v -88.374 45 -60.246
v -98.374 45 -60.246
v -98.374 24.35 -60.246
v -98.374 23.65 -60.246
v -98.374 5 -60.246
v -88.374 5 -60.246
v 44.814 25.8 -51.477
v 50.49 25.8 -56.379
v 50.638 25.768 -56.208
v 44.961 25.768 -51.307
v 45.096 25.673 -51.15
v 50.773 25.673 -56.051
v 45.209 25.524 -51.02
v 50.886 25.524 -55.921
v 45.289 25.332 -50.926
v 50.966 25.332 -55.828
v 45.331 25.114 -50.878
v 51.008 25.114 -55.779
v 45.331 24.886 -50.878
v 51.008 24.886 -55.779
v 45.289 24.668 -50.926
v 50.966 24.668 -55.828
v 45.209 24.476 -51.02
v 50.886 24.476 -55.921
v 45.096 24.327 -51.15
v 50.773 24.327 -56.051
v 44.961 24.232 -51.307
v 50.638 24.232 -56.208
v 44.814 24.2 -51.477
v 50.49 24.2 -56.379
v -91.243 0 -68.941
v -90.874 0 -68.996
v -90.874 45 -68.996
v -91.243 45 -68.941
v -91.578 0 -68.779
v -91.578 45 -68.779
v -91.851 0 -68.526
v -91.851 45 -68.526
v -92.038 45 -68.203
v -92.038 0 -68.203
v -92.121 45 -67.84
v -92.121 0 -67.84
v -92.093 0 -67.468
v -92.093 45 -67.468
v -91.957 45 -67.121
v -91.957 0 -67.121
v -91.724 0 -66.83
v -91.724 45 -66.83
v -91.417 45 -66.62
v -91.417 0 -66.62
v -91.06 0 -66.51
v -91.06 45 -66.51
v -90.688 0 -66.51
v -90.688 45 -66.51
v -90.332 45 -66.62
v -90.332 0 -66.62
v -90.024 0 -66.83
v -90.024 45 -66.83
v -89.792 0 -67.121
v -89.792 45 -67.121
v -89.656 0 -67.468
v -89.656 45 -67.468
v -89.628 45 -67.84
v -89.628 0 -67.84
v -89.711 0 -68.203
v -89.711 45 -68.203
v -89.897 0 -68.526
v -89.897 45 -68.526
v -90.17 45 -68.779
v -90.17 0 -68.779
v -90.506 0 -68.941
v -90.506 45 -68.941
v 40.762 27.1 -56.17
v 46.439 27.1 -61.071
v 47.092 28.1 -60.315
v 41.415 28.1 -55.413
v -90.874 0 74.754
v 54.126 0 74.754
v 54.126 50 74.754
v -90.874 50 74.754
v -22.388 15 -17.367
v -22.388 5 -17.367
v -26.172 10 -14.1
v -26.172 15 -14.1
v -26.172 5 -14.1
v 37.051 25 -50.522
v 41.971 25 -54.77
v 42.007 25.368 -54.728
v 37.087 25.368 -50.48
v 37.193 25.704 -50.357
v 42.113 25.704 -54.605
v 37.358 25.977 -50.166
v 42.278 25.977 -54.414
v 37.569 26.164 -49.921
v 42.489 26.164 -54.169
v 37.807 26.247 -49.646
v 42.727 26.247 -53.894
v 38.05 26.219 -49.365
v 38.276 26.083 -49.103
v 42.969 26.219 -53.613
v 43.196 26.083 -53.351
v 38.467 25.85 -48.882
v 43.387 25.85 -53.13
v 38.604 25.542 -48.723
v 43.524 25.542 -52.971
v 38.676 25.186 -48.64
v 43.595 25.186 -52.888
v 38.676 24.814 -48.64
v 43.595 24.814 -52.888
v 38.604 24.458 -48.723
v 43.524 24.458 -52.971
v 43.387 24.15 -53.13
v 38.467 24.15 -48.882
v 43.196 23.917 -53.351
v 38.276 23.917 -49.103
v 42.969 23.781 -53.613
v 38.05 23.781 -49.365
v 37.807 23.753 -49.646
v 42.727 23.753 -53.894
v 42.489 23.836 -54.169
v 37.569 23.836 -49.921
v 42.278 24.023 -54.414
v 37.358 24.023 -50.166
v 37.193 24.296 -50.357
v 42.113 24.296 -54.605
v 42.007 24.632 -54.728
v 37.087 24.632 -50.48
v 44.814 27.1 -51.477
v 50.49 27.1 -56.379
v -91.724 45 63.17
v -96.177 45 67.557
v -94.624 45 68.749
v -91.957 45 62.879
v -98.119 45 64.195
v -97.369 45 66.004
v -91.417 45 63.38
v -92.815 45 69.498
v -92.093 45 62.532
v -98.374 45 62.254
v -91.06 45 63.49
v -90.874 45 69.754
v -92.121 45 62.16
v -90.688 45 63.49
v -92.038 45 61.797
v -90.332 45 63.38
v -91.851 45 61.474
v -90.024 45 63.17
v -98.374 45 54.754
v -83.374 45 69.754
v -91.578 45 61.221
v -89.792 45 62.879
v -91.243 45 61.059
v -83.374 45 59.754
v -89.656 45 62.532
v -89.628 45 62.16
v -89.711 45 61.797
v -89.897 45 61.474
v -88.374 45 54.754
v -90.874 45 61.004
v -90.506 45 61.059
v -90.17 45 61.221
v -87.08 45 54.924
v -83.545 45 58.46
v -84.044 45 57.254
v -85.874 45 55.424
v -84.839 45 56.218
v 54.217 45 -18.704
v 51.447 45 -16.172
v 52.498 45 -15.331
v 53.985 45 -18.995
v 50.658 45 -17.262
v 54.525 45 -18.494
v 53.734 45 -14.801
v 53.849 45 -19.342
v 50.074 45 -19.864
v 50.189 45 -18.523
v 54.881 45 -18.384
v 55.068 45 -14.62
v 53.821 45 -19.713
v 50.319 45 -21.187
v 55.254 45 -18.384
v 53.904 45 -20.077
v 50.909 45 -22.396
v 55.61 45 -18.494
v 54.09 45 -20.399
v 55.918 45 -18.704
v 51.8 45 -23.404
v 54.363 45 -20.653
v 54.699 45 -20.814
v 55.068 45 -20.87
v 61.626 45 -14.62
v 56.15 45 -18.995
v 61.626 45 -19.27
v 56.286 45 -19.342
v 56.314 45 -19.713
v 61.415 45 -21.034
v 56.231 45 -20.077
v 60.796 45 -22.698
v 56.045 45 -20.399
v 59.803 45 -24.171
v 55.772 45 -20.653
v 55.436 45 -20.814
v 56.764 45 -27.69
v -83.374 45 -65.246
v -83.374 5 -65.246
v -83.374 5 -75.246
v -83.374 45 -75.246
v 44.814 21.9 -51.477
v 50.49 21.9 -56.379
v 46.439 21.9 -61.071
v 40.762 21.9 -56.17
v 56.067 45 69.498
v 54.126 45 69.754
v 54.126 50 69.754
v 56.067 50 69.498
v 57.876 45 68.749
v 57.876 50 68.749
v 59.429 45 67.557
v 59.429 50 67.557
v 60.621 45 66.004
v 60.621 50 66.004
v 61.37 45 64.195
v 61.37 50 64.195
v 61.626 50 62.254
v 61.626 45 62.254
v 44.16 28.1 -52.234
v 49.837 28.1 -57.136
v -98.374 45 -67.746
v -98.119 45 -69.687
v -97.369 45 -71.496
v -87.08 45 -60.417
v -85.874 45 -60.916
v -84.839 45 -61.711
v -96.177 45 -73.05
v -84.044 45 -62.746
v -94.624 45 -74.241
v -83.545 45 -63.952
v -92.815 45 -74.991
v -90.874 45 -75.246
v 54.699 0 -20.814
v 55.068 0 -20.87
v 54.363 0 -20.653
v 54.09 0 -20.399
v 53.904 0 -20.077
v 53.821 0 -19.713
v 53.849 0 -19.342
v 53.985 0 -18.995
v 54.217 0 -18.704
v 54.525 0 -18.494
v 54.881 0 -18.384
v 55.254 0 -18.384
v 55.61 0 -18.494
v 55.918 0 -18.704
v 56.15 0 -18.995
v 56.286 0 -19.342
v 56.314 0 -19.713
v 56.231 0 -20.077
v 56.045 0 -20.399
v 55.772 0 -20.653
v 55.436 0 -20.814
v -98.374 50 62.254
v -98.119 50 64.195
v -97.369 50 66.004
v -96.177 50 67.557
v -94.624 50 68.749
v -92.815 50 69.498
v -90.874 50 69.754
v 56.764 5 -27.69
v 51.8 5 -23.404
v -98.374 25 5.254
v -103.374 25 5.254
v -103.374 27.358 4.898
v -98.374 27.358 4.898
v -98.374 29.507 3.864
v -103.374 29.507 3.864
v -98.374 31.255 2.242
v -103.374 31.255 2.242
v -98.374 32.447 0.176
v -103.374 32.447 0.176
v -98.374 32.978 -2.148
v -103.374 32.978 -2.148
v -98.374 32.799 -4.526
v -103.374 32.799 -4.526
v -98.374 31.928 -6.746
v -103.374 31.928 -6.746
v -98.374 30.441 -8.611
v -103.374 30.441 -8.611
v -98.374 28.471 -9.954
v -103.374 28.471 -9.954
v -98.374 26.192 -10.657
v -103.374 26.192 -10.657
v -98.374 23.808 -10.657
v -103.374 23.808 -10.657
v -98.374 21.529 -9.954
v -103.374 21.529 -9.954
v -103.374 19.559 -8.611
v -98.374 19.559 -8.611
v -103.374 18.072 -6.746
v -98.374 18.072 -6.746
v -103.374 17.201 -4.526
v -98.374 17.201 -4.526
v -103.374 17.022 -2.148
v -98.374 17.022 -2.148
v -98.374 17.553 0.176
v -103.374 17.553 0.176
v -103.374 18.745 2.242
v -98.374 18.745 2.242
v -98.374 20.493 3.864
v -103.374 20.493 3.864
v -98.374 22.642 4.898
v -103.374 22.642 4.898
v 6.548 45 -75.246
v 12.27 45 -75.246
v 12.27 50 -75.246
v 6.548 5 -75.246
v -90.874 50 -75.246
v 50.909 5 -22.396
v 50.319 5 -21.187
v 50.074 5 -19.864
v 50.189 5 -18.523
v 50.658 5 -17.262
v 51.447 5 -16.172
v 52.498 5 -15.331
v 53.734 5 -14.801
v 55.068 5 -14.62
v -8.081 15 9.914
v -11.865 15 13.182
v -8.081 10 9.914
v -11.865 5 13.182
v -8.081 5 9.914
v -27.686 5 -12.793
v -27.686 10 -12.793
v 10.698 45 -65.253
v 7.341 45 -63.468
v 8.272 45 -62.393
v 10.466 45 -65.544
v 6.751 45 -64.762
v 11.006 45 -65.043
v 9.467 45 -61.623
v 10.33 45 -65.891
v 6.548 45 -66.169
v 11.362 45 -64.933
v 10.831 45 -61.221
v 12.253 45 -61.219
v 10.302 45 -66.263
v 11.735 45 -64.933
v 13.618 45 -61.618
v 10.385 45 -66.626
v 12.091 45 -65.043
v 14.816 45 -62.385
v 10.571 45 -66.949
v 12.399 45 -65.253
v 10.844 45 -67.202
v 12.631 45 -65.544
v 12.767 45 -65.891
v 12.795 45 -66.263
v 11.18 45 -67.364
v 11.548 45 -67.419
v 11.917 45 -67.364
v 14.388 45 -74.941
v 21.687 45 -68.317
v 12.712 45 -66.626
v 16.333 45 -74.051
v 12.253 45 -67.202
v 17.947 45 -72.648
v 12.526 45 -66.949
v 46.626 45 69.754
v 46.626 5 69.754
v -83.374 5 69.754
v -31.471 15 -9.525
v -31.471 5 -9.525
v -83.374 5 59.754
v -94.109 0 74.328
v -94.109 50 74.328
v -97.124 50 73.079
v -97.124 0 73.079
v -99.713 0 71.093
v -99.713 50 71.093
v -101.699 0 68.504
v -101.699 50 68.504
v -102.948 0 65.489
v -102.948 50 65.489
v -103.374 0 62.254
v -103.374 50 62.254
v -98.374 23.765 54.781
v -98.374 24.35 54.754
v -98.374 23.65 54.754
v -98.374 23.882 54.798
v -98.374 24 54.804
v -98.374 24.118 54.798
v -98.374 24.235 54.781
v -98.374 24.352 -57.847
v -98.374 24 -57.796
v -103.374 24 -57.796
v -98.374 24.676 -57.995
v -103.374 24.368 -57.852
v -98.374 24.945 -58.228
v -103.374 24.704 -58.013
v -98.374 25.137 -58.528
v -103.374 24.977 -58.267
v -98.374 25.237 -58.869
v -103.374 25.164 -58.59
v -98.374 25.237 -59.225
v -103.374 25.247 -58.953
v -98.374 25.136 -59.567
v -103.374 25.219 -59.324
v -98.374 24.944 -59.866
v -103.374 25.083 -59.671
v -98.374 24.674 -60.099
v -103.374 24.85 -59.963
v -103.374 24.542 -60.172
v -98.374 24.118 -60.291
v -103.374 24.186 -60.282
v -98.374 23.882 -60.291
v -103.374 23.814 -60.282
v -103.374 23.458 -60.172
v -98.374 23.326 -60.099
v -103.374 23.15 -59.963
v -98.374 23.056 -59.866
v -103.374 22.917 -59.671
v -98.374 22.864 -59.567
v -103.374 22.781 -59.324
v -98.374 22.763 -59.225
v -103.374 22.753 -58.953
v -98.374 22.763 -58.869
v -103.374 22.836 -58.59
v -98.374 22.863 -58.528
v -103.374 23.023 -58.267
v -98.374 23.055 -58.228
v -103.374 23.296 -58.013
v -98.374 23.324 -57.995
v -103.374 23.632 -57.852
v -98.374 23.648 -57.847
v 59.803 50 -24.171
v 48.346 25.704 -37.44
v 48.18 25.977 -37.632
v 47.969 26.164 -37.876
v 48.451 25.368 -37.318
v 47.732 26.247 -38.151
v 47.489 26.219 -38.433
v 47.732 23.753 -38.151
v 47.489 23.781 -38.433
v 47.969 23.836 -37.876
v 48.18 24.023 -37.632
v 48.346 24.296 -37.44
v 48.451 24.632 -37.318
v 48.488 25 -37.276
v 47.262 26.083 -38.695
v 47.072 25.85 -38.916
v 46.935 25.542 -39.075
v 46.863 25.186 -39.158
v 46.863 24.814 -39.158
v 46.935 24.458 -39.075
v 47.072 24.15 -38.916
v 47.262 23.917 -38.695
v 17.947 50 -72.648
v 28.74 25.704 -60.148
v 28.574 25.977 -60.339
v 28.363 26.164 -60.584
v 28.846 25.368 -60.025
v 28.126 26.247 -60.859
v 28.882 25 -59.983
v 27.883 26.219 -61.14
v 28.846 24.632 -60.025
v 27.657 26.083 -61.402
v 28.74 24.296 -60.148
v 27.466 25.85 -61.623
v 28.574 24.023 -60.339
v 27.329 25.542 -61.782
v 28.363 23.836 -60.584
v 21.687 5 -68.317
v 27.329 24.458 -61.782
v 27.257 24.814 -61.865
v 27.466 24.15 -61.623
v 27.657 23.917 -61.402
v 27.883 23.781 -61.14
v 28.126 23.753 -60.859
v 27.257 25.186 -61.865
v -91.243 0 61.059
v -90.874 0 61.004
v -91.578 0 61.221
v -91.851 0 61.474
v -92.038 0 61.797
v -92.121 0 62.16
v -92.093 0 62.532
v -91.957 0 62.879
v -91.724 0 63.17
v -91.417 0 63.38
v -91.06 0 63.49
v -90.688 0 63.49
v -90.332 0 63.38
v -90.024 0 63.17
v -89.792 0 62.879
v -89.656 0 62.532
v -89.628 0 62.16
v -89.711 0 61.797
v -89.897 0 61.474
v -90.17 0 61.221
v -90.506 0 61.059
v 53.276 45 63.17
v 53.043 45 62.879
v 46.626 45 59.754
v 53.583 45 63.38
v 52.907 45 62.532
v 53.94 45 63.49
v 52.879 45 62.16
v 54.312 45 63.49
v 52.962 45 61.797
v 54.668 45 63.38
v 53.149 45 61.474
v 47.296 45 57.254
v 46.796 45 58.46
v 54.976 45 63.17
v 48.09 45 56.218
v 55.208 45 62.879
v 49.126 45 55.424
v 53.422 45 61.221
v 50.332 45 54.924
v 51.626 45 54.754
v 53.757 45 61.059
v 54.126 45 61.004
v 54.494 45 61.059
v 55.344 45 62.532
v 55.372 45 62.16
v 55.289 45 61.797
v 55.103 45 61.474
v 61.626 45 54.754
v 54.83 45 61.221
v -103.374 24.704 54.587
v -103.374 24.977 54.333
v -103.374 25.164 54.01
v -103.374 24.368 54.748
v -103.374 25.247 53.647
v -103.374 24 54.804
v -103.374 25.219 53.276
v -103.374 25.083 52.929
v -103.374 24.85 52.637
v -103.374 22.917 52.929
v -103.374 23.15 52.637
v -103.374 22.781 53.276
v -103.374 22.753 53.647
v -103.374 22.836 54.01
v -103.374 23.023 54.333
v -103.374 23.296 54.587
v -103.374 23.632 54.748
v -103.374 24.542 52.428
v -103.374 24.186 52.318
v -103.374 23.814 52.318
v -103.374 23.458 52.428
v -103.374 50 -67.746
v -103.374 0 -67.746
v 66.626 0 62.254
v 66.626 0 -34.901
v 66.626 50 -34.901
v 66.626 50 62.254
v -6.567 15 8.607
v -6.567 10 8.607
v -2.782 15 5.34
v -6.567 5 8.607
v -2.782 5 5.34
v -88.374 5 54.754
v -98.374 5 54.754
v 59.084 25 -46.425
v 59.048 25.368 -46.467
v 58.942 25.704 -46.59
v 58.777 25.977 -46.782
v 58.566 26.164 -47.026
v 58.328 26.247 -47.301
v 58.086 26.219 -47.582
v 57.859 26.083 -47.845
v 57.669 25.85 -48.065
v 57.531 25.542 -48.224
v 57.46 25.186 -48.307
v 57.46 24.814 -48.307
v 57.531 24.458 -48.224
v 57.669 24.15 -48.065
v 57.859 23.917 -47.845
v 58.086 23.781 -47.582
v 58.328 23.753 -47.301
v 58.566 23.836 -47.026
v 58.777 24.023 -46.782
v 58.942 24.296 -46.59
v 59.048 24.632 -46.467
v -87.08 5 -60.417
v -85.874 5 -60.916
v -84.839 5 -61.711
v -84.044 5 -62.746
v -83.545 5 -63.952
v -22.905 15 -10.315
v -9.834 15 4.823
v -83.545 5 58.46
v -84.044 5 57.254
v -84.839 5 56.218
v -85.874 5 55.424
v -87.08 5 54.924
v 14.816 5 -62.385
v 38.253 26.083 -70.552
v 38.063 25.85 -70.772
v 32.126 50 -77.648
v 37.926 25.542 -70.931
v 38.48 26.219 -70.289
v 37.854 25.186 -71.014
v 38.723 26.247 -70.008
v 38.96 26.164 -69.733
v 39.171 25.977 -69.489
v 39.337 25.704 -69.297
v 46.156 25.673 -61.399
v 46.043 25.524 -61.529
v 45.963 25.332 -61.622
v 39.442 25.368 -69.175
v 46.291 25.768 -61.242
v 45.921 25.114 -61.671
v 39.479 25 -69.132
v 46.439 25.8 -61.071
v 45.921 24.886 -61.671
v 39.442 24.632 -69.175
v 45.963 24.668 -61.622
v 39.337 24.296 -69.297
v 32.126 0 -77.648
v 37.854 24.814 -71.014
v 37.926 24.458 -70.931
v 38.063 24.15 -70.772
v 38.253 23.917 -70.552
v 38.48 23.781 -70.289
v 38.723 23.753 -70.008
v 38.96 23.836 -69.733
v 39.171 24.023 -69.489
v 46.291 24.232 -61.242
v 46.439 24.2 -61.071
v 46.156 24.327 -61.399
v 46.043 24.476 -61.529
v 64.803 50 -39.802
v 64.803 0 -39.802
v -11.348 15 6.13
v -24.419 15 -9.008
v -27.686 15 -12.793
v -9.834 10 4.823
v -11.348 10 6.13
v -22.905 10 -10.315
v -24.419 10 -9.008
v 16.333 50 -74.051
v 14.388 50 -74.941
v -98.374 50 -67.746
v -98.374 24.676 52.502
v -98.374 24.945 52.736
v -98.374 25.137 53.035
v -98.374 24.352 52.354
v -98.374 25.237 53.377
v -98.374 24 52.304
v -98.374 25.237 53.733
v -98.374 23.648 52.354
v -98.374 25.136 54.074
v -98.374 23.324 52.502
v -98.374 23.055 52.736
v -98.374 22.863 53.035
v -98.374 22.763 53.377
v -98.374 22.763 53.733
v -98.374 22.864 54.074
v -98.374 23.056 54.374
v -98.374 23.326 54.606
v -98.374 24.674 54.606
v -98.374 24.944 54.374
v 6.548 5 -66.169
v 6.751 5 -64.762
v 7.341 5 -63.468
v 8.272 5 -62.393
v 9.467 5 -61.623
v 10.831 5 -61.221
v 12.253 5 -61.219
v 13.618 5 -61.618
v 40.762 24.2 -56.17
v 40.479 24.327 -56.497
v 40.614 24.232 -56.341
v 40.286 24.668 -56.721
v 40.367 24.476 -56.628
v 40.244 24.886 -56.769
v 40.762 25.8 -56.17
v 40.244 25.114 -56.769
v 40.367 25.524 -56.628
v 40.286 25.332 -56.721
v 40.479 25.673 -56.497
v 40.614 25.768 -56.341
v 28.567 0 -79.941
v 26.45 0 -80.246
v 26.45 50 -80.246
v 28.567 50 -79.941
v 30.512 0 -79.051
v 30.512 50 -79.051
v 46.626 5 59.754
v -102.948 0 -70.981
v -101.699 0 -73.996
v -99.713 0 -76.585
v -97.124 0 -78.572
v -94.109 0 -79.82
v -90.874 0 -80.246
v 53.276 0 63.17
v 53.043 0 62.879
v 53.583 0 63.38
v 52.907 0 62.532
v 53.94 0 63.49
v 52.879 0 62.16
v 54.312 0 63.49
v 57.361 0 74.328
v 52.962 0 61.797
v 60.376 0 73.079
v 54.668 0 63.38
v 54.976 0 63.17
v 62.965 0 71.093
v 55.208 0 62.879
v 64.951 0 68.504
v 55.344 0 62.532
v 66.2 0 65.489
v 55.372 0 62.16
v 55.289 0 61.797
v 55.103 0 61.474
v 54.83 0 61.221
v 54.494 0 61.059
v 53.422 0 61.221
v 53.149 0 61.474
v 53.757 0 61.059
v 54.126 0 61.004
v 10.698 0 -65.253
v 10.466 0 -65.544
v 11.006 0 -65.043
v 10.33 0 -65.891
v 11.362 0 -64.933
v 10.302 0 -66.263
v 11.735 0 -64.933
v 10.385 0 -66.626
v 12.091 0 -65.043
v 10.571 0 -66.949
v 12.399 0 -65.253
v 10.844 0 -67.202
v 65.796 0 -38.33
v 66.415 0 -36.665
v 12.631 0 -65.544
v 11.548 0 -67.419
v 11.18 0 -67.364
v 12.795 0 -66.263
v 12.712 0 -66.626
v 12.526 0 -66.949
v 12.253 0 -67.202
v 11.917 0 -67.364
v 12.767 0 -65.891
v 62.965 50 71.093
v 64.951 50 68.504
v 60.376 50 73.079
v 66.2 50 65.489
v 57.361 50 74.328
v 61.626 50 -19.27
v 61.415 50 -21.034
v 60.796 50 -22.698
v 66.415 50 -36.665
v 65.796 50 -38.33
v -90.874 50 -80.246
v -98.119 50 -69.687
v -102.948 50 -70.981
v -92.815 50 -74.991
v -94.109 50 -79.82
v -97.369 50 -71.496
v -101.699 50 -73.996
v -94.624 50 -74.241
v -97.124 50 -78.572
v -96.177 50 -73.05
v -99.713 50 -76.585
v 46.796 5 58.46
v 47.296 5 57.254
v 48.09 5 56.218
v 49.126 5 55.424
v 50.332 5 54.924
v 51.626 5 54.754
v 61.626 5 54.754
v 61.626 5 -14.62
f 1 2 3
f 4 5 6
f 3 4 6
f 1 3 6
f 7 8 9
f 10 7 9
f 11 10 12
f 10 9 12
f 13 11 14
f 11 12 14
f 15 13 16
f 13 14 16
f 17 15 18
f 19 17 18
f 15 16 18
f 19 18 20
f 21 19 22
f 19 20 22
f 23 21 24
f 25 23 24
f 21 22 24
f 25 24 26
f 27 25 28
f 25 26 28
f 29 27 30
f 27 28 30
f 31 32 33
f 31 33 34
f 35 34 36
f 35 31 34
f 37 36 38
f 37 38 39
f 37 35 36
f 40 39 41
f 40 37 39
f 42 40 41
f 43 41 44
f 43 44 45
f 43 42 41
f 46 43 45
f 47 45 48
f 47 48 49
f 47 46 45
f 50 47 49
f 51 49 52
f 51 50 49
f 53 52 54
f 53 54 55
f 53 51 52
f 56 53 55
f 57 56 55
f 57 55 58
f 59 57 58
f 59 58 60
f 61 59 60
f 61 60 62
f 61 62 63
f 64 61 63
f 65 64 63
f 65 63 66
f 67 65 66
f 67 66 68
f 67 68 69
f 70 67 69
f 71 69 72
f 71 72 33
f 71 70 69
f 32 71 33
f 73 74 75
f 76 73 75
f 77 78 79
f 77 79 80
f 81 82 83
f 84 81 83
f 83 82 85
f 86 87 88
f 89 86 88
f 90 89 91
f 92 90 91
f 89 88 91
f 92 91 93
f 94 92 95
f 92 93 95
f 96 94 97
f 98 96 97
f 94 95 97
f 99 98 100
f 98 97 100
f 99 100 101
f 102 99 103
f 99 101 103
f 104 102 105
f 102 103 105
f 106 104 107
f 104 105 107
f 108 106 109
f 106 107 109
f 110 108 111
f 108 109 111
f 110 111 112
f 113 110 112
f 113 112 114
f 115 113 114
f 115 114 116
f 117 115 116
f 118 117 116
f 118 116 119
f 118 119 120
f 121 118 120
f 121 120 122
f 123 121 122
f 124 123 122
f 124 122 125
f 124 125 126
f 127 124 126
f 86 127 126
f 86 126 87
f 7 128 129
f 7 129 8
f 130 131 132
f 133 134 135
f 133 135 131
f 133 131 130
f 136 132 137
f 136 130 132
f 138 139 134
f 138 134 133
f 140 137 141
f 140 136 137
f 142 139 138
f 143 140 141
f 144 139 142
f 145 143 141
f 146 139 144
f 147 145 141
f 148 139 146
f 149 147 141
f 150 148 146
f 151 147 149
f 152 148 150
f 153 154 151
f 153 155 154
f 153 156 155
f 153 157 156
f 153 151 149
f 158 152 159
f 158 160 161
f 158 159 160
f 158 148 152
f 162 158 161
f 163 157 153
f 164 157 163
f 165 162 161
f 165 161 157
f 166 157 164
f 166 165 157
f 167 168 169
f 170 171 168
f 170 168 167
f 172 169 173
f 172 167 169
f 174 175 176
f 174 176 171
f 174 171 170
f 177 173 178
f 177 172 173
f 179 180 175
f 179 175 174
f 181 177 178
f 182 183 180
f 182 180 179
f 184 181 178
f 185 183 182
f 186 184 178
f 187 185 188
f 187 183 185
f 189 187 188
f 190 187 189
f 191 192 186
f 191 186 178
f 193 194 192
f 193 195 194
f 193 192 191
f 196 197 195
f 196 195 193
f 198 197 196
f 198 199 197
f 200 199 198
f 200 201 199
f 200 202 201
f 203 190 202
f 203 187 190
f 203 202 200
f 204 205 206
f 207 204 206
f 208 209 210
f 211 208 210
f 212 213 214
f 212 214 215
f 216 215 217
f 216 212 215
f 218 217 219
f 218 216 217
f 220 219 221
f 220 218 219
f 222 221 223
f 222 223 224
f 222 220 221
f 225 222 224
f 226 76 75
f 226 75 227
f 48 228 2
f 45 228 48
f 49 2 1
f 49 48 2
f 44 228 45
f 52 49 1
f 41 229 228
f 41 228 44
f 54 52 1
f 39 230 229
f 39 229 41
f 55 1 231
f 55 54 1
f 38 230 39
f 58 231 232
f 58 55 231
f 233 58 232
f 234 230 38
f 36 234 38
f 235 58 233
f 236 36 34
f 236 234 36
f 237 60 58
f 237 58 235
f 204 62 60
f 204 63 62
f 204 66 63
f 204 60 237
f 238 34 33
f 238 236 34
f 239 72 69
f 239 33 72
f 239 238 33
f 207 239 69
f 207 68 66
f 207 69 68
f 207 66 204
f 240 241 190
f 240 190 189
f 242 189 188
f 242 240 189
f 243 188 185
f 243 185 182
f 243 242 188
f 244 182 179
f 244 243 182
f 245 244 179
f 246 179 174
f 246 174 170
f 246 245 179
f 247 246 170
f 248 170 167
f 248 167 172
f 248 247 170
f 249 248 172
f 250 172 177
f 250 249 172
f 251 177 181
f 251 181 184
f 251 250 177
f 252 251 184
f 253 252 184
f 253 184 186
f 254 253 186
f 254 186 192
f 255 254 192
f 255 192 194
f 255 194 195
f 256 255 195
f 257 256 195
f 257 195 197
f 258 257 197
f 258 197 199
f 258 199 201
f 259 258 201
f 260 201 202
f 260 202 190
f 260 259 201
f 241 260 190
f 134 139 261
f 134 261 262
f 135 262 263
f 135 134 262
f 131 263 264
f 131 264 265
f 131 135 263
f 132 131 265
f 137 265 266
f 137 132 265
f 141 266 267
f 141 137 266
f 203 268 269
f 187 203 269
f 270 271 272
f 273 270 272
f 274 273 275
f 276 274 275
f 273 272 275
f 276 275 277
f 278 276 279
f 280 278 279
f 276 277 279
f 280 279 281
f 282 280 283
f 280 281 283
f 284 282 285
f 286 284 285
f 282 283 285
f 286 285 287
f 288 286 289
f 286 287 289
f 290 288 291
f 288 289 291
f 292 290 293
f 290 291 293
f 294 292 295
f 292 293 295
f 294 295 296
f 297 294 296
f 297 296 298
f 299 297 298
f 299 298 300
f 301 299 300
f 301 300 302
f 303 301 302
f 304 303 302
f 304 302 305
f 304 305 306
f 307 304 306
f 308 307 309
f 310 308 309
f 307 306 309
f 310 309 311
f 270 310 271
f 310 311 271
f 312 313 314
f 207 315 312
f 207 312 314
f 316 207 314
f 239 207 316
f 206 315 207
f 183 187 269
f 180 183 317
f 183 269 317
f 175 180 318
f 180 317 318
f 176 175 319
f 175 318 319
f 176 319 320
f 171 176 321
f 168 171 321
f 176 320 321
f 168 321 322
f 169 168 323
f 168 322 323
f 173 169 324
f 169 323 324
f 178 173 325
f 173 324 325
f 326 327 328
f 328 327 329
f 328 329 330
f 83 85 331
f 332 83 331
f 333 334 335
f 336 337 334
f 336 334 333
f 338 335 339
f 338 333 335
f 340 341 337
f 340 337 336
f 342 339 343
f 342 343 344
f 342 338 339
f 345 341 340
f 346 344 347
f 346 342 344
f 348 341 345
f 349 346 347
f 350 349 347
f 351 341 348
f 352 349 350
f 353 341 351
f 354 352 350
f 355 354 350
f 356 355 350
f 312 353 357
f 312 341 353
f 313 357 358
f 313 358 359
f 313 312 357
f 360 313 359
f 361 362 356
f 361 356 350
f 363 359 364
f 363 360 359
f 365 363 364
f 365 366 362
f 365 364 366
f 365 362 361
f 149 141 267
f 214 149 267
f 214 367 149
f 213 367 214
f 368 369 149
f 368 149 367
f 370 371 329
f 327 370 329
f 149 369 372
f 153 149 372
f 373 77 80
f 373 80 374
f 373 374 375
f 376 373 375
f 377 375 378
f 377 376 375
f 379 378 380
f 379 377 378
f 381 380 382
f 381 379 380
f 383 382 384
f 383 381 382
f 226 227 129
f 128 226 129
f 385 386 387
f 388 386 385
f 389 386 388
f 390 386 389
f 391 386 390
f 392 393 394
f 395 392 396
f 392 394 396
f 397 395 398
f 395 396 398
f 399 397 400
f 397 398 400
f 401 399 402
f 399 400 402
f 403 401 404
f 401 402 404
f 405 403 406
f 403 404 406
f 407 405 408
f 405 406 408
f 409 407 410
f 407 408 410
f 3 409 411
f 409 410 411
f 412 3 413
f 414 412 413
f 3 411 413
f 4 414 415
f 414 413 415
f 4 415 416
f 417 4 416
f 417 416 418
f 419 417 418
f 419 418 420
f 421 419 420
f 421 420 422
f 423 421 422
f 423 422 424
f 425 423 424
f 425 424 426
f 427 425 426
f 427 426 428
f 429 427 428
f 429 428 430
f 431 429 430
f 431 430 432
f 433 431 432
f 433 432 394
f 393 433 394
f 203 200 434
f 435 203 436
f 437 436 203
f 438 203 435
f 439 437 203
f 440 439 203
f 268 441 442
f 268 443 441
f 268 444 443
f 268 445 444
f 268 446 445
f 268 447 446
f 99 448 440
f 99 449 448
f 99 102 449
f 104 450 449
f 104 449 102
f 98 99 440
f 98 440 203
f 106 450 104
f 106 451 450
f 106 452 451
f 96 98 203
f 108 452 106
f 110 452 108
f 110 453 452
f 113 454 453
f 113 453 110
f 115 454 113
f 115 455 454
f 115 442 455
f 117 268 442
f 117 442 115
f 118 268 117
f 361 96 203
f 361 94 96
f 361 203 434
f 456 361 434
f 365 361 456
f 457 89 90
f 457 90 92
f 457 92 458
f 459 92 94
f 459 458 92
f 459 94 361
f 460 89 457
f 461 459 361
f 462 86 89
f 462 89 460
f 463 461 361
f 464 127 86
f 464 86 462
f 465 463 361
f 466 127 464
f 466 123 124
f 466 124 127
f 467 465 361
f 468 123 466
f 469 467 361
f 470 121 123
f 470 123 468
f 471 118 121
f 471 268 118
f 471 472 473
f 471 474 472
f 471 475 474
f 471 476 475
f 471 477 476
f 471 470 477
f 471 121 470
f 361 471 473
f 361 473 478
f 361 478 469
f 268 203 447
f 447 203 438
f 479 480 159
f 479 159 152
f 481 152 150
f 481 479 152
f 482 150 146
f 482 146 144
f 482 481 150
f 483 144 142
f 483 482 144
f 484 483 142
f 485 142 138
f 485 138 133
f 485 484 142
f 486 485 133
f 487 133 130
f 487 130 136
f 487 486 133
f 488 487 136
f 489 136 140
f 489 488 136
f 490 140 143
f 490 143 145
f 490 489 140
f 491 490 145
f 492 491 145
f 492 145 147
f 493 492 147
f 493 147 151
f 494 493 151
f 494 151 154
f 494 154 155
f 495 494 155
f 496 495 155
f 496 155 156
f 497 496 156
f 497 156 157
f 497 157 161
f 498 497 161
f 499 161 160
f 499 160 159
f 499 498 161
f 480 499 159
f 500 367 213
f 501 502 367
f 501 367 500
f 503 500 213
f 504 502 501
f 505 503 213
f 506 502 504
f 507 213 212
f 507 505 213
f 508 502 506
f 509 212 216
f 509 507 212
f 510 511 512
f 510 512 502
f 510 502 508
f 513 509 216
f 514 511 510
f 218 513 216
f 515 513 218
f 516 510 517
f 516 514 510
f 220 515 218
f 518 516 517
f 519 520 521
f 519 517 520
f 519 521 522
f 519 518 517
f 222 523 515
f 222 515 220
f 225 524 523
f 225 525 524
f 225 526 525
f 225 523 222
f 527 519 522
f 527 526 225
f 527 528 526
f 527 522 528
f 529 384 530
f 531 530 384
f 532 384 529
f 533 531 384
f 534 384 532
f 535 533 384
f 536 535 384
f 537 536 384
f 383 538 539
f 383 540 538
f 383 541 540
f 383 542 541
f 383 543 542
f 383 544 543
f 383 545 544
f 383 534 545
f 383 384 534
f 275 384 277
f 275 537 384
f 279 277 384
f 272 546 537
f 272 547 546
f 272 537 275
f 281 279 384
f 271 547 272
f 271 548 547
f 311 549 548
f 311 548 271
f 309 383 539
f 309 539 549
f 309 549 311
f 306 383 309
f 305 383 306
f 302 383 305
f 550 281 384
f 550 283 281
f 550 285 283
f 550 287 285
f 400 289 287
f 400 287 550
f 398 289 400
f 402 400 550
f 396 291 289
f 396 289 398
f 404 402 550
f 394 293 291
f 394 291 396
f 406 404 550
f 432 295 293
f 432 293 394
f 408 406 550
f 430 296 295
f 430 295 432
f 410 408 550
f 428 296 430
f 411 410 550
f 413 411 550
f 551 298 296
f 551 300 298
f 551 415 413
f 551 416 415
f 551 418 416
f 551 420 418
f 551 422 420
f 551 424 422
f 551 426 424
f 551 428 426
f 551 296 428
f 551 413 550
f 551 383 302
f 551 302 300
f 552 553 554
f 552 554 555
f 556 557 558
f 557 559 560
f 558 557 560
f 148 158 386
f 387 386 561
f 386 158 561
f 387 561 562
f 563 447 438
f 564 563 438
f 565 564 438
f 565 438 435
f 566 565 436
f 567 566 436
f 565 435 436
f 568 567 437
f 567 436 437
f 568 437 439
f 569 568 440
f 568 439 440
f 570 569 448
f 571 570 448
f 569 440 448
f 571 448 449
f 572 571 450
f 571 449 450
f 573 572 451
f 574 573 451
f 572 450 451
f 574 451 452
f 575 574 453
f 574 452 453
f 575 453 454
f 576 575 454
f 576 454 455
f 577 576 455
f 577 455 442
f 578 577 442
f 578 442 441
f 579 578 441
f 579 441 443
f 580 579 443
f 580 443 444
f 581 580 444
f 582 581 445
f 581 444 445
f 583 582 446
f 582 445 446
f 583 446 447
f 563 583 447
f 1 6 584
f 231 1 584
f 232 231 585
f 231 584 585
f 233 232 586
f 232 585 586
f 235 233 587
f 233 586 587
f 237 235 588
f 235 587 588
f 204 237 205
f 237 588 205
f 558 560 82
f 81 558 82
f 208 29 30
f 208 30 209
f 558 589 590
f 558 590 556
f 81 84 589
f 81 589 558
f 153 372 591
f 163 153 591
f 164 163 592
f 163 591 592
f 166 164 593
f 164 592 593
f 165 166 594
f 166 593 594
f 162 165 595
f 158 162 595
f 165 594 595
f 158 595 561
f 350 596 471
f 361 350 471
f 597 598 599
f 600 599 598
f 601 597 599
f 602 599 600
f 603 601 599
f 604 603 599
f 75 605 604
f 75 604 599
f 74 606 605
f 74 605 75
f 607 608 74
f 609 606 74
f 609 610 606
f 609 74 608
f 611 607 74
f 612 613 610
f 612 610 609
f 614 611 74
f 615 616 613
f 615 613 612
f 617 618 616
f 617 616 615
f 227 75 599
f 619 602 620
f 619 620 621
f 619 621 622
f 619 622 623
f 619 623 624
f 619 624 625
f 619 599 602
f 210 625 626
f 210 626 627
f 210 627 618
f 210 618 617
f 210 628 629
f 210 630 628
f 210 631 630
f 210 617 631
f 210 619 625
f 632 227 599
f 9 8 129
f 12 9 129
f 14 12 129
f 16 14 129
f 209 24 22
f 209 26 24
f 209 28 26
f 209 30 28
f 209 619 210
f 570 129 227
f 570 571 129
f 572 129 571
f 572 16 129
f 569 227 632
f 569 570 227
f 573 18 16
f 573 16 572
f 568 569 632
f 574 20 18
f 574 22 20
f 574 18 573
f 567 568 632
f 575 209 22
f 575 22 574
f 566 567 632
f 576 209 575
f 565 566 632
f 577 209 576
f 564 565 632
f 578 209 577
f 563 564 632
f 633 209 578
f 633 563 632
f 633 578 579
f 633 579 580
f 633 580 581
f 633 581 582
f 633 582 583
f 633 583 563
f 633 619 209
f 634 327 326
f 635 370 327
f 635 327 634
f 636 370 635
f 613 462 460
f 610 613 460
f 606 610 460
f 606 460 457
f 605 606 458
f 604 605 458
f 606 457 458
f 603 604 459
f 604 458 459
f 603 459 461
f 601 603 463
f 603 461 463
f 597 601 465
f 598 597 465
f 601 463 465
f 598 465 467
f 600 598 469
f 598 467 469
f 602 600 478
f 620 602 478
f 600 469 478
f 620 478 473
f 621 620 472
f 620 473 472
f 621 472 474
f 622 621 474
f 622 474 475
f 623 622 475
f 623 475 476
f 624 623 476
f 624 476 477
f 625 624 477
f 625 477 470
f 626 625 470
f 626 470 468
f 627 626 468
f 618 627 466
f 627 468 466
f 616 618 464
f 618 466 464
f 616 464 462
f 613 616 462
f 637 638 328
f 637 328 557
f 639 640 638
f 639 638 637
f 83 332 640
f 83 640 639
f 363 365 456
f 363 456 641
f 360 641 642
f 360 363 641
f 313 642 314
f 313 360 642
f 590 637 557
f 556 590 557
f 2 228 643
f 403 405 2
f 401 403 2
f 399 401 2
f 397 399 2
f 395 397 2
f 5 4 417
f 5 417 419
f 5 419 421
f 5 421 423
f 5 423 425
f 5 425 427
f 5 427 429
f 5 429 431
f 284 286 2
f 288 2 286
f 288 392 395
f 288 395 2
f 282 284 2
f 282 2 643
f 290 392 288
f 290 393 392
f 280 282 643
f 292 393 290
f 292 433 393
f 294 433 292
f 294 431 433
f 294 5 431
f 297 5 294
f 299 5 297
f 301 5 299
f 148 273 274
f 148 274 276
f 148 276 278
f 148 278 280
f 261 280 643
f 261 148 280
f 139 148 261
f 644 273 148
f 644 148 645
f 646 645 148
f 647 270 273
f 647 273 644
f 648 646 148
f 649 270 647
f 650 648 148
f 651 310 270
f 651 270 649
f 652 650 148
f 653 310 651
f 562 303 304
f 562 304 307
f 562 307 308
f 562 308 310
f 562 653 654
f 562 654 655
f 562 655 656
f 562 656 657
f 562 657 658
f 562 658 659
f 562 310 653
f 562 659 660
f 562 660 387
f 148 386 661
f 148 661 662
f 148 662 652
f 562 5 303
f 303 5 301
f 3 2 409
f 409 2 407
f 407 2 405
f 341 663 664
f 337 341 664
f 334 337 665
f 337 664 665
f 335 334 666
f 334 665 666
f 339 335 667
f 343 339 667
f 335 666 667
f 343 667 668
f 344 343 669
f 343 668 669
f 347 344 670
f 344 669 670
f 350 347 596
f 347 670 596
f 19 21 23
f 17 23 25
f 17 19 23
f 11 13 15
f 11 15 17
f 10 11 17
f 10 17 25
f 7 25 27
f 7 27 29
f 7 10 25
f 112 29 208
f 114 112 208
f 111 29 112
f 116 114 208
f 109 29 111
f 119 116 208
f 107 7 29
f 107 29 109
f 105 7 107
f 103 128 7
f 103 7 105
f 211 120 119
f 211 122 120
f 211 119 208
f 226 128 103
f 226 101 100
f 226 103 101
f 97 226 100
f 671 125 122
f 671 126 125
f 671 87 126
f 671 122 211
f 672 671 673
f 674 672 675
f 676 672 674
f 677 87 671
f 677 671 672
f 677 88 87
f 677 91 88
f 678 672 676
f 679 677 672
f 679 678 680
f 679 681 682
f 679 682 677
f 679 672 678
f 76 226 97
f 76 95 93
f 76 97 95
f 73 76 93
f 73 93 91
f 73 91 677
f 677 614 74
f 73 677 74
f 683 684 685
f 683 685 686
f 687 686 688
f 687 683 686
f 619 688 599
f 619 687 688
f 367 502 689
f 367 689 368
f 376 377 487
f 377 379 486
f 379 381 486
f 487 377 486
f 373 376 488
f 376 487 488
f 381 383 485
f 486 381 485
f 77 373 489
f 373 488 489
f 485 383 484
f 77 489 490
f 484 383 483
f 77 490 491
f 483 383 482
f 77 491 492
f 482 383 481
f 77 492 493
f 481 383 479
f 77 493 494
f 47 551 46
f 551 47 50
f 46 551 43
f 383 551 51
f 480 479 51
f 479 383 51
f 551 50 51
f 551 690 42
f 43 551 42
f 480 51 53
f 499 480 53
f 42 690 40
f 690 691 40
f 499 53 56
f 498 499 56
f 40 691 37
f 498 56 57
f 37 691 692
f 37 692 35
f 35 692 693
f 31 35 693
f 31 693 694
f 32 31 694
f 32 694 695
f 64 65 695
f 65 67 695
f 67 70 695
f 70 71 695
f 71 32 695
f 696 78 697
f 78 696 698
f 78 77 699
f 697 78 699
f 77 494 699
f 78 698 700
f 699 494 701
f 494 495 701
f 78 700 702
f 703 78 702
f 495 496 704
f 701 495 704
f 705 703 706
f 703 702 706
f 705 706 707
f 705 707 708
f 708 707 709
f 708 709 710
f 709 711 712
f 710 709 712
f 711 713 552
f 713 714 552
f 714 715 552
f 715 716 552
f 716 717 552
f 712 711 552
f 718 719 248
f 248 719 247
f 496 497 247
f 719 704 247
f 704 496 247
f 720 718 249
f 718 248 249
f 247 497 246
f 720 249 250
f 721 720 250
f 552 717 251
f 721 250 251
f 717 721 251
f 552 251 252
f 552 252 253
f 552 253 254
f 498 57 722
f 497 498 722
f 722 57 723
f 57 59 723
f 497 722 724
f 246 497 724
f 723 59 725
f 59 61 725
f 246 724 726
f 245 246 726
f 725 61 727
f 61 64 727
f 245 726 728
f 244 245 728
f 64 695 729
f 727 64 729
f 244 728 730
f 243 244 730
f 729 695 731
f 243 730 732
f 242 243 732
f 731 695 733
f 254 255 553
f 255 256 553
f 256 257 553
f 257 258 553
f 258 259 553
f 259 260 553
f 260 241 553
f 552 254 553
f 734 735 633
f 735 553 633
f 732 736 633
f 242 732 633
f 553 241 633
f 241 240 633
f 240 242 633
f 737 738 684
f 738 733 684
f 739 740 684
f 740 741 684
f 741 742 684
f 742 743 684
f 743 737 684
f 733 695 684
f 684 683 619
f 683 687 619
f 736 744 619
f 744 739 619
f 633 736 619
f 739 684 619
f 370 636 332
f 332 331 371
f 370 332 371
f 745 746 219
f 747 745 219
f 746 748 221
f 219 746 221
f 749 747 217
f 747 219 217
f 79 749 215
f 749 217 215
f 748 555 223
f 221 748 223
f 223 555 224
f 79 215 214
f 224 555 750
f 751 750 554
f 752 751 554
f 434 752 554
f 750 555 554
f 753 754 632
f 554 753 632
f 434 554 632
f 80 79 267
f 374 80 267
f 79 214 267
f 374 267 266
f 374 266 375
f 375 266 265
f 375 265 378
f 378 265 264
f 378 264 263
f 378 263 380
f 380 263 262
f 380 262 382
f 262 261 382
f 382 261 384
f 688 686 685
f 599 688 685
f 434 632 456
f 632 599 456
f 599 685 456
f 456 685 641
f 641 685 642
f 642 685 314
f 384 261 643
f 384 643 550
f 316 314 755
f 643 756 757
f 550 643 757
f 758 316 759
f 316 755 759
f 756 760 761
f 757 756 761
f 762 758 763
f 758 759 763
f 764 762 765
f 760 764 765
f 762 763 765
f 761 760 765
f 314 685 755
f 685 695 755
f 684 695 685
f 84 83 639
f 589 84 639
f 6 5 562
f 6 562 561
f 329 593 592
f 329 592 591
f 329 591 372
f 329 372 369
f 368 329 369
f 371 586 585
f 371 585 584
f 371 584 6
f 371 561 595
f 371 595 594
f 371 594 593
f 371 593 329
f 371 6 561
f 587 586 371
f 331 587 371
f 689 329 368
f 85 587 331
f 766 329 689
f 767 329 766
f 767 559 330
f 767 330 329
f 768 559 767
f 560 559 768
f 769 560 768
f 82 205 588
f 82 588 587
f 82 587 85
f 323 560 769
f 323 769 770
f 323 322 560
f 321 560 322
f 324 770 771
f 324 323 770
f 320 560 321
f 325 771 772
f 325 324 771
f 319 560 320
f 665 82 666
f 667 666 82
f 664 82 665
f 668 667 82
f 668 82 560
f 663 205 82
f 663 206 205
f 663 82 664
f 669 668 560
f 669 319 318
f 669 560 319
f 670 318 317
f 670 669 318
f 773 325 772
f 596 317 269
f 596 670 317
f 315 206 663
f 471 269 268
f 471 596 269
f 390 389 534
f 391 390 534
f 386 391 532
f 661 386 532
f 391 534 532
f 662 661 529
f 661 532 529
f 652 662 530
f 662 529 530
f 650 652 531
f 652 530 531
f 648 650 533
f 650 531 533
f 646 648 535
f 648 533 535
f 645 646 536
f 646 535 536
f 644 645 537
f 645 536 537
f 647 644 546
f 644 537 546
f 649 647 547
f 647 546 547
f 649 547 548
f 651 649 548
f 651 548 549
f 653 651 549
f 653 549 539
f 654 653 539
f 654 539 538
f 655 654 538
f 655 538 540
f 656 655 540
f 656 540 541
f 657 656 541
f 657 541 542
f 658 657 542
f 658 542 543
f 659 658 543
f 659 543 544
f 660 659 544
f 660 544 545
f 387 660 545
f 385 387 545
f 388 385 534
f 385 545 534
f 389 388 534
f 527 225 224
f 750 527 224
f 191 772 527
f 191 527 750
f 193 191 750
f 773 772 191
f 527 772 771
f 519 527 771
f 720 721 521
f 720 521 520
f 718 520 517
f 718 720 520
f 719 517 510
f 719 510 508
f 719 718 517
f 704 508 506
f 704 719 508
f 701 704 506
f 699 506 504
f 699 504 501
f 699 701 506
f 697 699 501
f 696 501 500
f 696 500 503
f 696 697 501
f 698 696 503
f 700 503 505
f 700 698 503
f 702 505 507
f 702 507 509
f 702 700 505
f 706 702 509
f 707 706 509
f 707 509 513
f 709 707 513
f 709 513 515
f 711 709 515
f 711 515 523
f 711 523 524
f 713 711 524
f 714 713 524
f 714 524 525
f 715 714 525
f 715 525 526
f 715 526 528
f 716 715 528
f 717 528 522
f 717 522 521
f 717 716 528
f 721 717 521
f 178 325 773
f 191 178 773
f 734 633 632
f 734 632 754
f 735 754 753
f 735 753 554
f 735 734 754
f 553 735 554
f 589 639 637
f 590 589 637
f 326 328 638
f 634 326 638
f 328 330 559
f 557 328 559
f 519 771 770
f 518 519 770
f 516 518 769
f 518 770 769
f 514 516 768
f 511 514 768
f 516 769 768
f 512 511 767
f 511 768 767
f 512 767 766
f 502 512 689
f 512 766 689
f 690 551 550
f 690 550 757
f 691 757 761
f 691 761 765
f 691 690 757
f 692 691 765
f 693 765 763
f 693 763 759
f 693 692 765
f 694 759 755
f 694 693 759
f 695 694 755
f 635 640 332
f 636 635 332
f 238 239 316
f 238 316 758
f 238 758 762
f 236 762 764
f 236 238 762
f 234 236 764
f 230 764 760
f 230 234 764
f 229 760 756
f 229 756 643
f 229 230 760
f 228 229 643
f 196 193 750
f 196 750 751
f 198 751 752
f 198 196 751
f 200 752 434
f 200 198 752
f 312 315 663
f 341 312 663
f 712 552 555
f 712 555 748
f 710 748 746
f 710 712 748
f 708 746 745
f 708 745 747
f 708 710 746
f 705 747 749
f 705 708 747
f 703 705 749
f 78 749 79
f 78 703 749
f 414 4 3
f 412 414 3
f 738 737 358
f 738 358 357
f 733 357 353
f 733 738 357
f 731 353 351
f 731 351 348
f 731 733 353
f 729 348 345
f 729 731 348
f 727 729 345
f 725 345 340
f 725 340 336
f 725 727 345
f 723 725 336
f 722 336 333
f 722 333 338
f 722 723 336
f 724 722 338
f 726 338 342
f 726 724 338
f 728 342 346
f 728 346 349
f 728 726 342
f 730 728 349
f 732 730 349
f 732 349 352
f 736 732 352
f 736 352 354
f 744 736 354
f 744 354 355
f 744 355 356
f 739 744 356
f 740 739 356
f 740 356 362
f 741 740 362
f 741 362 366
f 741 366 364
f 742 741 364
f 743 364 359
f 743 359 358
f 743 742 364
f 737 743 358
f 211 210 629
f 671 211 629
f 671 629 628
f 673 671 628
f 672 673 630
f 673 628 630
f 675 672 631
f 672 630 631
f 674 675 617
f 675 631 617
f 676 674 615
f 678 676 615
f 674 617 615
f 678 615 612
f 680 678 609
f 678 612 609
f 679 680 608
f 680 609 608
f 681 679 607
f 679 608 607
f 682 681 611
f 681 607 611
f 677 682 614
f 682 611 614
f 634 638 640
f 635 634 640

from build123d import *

# Parameters (mm, degrees)
EXTRUDE_2_DEPTH     = 5
EXTRUDE_2_2_DEPTH   = 5
EXTRUDE_3_DEPTH     = 50
EXTRUDE_4_DEPTH     = 10
CUT_EXTRUDE_1_DEPTH = 7.5
SKETCH_9_R          = 1.25
CUT_EXTRUDE_3_DEPTH = 20
SKETCH_10_R         = 8
SKETCH_10_R_2       = 1.25
CUT_EXTRUDE_7_DEPTH = 5
SKETCH_1_9_R        = 1.25
EXTRUDE_5_DEPTH     = 45
SKETCH_14_R         = 1.25
CUT_EXTRUDE_8_DEPTH = 14
EXTRUDE_6_DEPTH     = 15


# Read off the part's stored shape, not the designer's step: 凸台-拉伸4
with BuildPart() as part:
    # 草图1 → 凸台-拉伸2 (new body)
    with BuildSketch(Plane(origin=(0, 0, 0), x_dir=(1, 0, 0), z_dir=(0, 1, 0))):
        with BuildLine():
            Line((6.548408352, 75.246242124), (-83.374180902, 75.246242124))
            Line((-83.374180902, 75.246242124), (-83.374180902, 65.246242124))
            ThreePointArc((-83.374180902, 65.246242124), (-84.838646996, 61.710708218), (-88.374180902, 60.246242124))
            Line((-88.374180902, 60.246242124), (-98.374180902, 60.246242124))
            Line((-98.374180902, 60.246242124), (-98.374180902, -54.753757876))
            Line((-98.374180902, -54.753757876), (-88.374180902, -54.753757876))
            ThreePointArc((-88.374180902, -54.753757876), (-84.838646996, -56.21822397), (-83.374180902, -59.753757876))
            Line((-83.374180902, -59.753757876), (-83.374180902, -69.753757876))
            Line((-83.374180902, -69.753757876), (46.625819098, -69.753757876))
            Line((46.625819098, -69.753757876), (46.625819098, -59.753757876))
            ThreePointArc((46.625819098, -59.753757876), (48.090285193, -56.21822397), (51.625819098, -54.753757876))
            Line((51.625819098, -54.753757876), (61.625819098, -54.753757876))
            Line((61.625819098, -54.753757876), (61.625819098, 14.619924984))
            Line((61.625819098, 14.619924984), (55.067595409, 14.619924984))
            ThreePointArc((55.067595409, 14.619924984), (50.381304866, 17.876743713), (51.799973847, 23.404452606))
            Line((51.799973847, 23.404452606), (56.763929588, 27.690411234))
            Line((56.763929588, 27.690411234), (21.686518841, 68.316728374))
            Line((21.686518841, 68.316728374), (14.816029914, 62.384638559))
            ThreePointArc((14.816029914, 62.384638559), (9.467315828, 61.622843062), (6.548408352, 66.169166182))
            Line((6.548408352, 66.169166182), (6.548408352, 75.246242124))
        make_face()
        Polygon((-31.470797546, 9.525154804), (-22.387931252, 17.367446554), (-2.782201877, -5.33971918), (-11.865068171, -13.18201093), align=None, mode=Mode.SUBTRACT)
    extrude(amount=EXTRUDE_2_DEPTH)

    # 草图1<6> → 凸台-拉伸3 (add)
    with BuildSketch(Plane(origin=(0, 0, 0), x_dir=(1, 0, 0), z_dir=(0, 1, 0))):
        with BuildLine():
            Line((66.625819098, 34.900965901), (66.625819098, -62.253757876))
            ThreePointArc((66.625819098, -62.253757876), (62.964653863, -71.092592641), (54.125819098, -74.753757876))
            Line((54.125819098, -74.753757876), (-90.874180902, -74.753757876))
            ThreePointArc((-90.874180902, -74.753757876), (-99.713015666, -71.092592641), (-103.374180902, -62.253757876))
            Line((-103.374180902, -62.253757876), (-103.374180902, 67.746242124))
            ThreePointArc((-103.374180902, 67.746242124), (-99.713015666, 76.585076889), (-90.874180902, 80.246242124))
            Line((-90.874180902, 80.246242124), (26.449603474, 80.246242124))
            ThreePointArc((26.449603474, 80.246242124), (29.57124226, 79.565726803), (32.126394907, 77.647674468))
            Line((32.126394907, 77.647674468), (64.802610532, 39.802398244))
            ThreePointArc((64.802610532, 39.802398244), (66.155254913, 37.515737807), (66.625819098, 34.900965901))
        make_face()
        with BuildLine():
            ThreePointArc((61.625819098, 19.269608073), (61.155254913, 21.88437998), (59.802610532, 24.171040417))
            Line((59.802610532, 24.171040417), (17.947110848, 72.647674468))
            ThreePointArc((17.947110848, 72.647674468), (15.3919582, 74.565726803), (12.270319414, 75.246242124))
            Line((12.270319414, 75.246242124), (-90.874180902, 75.246242124))
            ThreePointArc((-90.874180902, 75.246242124), (-96.17748176, 73.049542983), (-98.374180902, 67.746242124))
            Line((-98.374180902, 67.746242124), (-98.374180902, -62.253757876))
            ThreePointArc((-98.374180902, -62.253757876), (-96.17748176, -67.557058735), (-90.874180902, -69.753757876))
            Line((-90.874180902, -69.753757876), (54.125819098, -69.753757876))
            ThreePointArc((54.125819098, -69.753757876), (59.429119957, -67.557058735), (61.625819098, -62.253757876))
            Line((61.625819098, -62.253757876), (61.625819098, 19.269608073))
        make_face(mode=Mode.SUBTRACT)
    extrude(amount=EXTRUDE_3_DEPTH)

    # 凸台-拉伸4 outline → 凸台-拉伸4 (add)
    with BuildSketch(Plane(origin=(0, 0, 0), x_dir=(1, 0, 0), z_dir=(0, 1, 0))):
        Polygon((-6.5667295, -8.607340743), (-26.172458875, 14.099824991), (-27.686269924, 12.792776366), (-8.080540549, -9.914389368), align=None)
    extrude(amount=EXTRUDE_4_DEPTH)

    # 草图6 → 切除-拉伸1 (cut)
    with BuildSketch(Plane(origin=(56.814304212, 0, -49.054377198), x_dir=(-0.6535243124977221, 0, -0.7569055244707755), z_dir=(0.7569055244707754, 0, -0.653524312497722))):
        with BuildLine():
            Line((9.676573622, 24.2), (9.676573622, 21.9))
            Line((9.676573622, 21.9), (15.876573622, 21.9))
            Line((15.876573622, 21.9), (15.876573622, 24.2))
            ThreePointArc((15.876573622, 24.2), (16.676573622, 25), (15.876573622, 25.8))
            Line((15.876573622, 25.8), (15.876573622, 27.1))
            Line((15.876573622, 27.1), (14.876573622, 28.1))
            Line((14.876573622, 28.1), (10.676573622, 28.1))
            Line((10.676573622, 28.1), (9.676573622, 27.1))
            Line((9.676573622, 27.1), (9.676573622, 25.8))
            ThreePointArc((9.676573622, 25.8), (8.876573622, 25), (9.676573622, 24.2))
        make_face()
    extrude(amount=-CUT_EXTRUDE_1_DEPTH, mode=Mode.SUBTRACT)

    # 草图9 → 切除-拉伸3 (cut)
    with BuildSketch(Plane(origin=(51.137512779, 0, -44.152944854), x_dir=(-0.6535243124977224, 0, -0.7569055244707754), z_dir=(0.7569055244707754, 0, -0.6535243124977224))):
        with Locations((12.776573622, 25)):
            Circle(SKETCH_9_R)
    extrude(amount=-CUT_EXTRUDE_3_DEPTH, mode=Mode.SUBTRACT)

    # 草图10 → 切除-拉伸7 (cut)
    with BuildSketch(Plane.ZY.offset(103.374180902)):
        with Locations((-2.746242124, 25)):
            Circle(SKETCH_10_R)
        with Locations((-59.046242124, 24)):
            Circle(SKETCH_10_R_2)
        with Locations((53.553757876, 24)):
            Circle(SKETCH_10_R_2)
    extrude(amount=-CUT_EXTRUDE_7_DEPTH, mode=Mode.SUBTRACT)

    # 草图1<9> → 凸台-拉伸5 (add)
    # profile 1 of 5: a face of its own
    with BuildSketch(Plane(origin=(0, 0, 0), x_dir=(1, 0, 0), z_dir=(0, 1, 0))):
        with BuildLine():
            Line((-83.374180902, 75.246242124), (-90.874180902, 75.246242124))
            ThreePointArc((-90.874180902, 75.246242124), (-96.17748176, 73.049542983), (-98.374180902, 67.746242124))
            Line((-98.374180902, 67.746242124), (-98.374180902, 60.246242124))
            Line((-98.374180902, 60.246242124), (-88.374180902, 60.246242124))
            ThreePointArc((-88.374180902, 60.246242124), (-84.838646996, 61.710708218), (-83.374180902, 65.246242124))
            Line((-83.374180902, 65.246242124), (-83.374180902, 75.246242124))
        make_face()
        with Locations(Location((-90.874180902, 67.746242124, 0), (0, 0, 90))):
            Circle(SKETCH_1_9_R, mode=Mode.SUBTRACT)
    # profile 2 of 5: a face of its own
    with BuildSketch(Plane(origin=(0, 0, 0), x_dir=(1, 0, 0), z_dir=(0, 1, 0))):
        with BuildLine():
            Line((-88.374180902, -54.753757876), (-98.374180902, -54.753757876))
            Line((-98.374180902, -54.753757876), (-98.374180902, -62.253757876))
            ThreePointArc((-98.374180902, -62.253757876), (-96.17748176, -67.557058735), (-90.874180902, -69.753757876))
            Line((-90.874180902, -69.753757876), (-83.374180902, -69.753757876))
            Line((-83.374180902, -69.753757876), (-83.374180902, -59.753757876))
            ThreePointArc((-83.374180902, -59.753757876), (-84.838646996, -56.21822397), (-88.374180902, -54.753757876))
        make_face()
        with Locations(Location((-90.874180902, -62.253757876, 0), (0, 0, 90))):
            Circle(SKETCH_1_9_R, mode=Mode.SUBTRACT)
    # profile 3 of 5: a face of its own
    with BuildSketch(Plane(origin=(0, 0, 0), x_dir=(1, 0, 0), z_dir=(0, 1, 0))):
        with BuildLine():
            Line((46.625819098, -59.753757876), (46.625819098, -69.753757876))
            Line((46.625819098, -69.753757876), (54.125819098, -69.753757876))
            ThreePointArc((54.125819098, -69.753757876), (59.429119957, -67.557058735), (61.625819098, -62.253757876))
            Line((61.625819098, -62.253757876), (61.625819098, -54.753757876))
            Line((61.625819098, -54.753757876), (51.625819098, -54.753757876))
            ThreePointArc((51.625819098, -54.753757876), (48.090285193, -56.21822397), (46.625819098, -59.753757876))
        make_face()
        with Locations(Location((54.125819098, -62.253757876, 0), (0, 0, 90))):
            Circle(SKETCH_1_9_R, mode=Mode.SUBTRACT)
    # profile 4 of 5: a face of its own
    with BuildSketch(Plane(origin=(0, 0, 0), x_dir=(1, 0, 0), z_dir=(0, 1, 0))):
        with BuildLine():
            Line((59.802610532, 24.171040417), (56.763929588, 27.690411234))
            Line((56.763929588, 27.690411234), (51.799973847, 23.404452606))
            ThreePointArc((51.799973847, 23.404452606), (50.381304866, 17.876743713), (55.067595409, 14.619924984))
            Line((55.067595409, 14.619924984), (61.625819098, 14.619924984))
            Line((61.625819098, 14.619924984), (61.625819098, 19.269608073))
            ThreePointArc((61.625819098, 19.269608073), (61.155254913, 21.88437998), (59.802610532, 24.171040417))
        make_face()
        with Locations(Location((55.067595409, 19.619924984, 0), (0, 0, 90))):
            Circle(SKETCH_1_9_R, mode=Mode.SUBTRACT)
    # profile 5 of 5: a face of its own
    with BuildSketch(Plane(origin=(0, 0, 0), x_dir=(1, 0, 0), z_dir=(0, 1, 0))):
        with BuildLine():
            Line((12.270319414, 75.246242124), (6.548408352, 75.246242124))
            Line((6.548408352, 75.246242124), (6.548408352, 66.169166182))
            ThreePointArc((6.548408352, 66.169166182), (9.467315828, 61.622843062), (14.816029914, 62.384638559))
            Line((14.816029914, 62.384638559), (21.686518841, 68.316728374))
            Line((21.686518841, 68.316728374), (17.947110848, 72.647674468))
            ThreePointArc((17.947110848, 72.647674468), (15.3919582, 74.565726803), (12.270319414, 75.246242124))
        make_face()
        with Locations(Location((11.548408352, 66.169166182, 0), (0, 0, 90))):
            Circle(SKETCH_1_9_R, mode=Mode.SUBTRACT)
    extrude(amount=EXTRUDE_5_DEPTH)

    # 草图14 → 切除-拉伸8 (cut)
    with BuildSketch(Plane(origin=(46.21762687, 0, -39.905036823), x_dir=(0.6535243124977226, 0, 0.7569055244707751), z_dir=(-0.7569055244707751, 0, 0.6535243124977226))):
        with Locations((2.223426378, 25)):
            Circle(SKETCH_14_R)
        with Locations((-27.776573622, 25)):
            Circle(SKETCH_14_R)
    extrude(amount=-CUT_EXTRUDE_8_DEPTH, mode=Mode.SUBTRACT)



with BuildPart() as body_2:
    # 草图1 → Extrude 2 2 (new body)
    with BuildSketch(Plane(origin=(0, 0, 0), x_dir=(1, 0, 0), z_dir=(0, 1, 0))):
        Polygon((-9.834351062, -4.822813121), (-22.904837312, 10.315297369), (-24.418648361, 9.008248744), (-11.348162111, -6.129861746), align=None)
    extrude(amount=EXTRUDE_2_2_DEPTH)


with BuildPart() as part_1:
    add(part.part)

    add(body_2.part)  # 凸台-拉伸6 merges body 2
    # 草图1<10> → 凸台-拉伸6 (add)
    with BuildSketch(Plane(origin=(0, 0, 0), x_dir=(1, 0, 0), z_dir=(0, 1, 0))):
        Polygon((-26.172458875, 14.099824991), (-22.904837312, 10.315297369), (-9.834351062, -4.822813121), (-6.5667295, -8.607340743), (-2.782201877, -5.33971918), (-22.387931252, 17.367446554), align=None)
        Polygon((-11.348162111, -6.129861746), (-24.418648361, 9.008248744), (-27.686269924, 12.792776366), (-31.470797546, 9.525154804), (-11.865068171, -13.18201093), (-8.080540549, -9.914389368), align=None)
    extrude(amount=EXTRUDE_6_DEPTH)


solid = part_1.part
